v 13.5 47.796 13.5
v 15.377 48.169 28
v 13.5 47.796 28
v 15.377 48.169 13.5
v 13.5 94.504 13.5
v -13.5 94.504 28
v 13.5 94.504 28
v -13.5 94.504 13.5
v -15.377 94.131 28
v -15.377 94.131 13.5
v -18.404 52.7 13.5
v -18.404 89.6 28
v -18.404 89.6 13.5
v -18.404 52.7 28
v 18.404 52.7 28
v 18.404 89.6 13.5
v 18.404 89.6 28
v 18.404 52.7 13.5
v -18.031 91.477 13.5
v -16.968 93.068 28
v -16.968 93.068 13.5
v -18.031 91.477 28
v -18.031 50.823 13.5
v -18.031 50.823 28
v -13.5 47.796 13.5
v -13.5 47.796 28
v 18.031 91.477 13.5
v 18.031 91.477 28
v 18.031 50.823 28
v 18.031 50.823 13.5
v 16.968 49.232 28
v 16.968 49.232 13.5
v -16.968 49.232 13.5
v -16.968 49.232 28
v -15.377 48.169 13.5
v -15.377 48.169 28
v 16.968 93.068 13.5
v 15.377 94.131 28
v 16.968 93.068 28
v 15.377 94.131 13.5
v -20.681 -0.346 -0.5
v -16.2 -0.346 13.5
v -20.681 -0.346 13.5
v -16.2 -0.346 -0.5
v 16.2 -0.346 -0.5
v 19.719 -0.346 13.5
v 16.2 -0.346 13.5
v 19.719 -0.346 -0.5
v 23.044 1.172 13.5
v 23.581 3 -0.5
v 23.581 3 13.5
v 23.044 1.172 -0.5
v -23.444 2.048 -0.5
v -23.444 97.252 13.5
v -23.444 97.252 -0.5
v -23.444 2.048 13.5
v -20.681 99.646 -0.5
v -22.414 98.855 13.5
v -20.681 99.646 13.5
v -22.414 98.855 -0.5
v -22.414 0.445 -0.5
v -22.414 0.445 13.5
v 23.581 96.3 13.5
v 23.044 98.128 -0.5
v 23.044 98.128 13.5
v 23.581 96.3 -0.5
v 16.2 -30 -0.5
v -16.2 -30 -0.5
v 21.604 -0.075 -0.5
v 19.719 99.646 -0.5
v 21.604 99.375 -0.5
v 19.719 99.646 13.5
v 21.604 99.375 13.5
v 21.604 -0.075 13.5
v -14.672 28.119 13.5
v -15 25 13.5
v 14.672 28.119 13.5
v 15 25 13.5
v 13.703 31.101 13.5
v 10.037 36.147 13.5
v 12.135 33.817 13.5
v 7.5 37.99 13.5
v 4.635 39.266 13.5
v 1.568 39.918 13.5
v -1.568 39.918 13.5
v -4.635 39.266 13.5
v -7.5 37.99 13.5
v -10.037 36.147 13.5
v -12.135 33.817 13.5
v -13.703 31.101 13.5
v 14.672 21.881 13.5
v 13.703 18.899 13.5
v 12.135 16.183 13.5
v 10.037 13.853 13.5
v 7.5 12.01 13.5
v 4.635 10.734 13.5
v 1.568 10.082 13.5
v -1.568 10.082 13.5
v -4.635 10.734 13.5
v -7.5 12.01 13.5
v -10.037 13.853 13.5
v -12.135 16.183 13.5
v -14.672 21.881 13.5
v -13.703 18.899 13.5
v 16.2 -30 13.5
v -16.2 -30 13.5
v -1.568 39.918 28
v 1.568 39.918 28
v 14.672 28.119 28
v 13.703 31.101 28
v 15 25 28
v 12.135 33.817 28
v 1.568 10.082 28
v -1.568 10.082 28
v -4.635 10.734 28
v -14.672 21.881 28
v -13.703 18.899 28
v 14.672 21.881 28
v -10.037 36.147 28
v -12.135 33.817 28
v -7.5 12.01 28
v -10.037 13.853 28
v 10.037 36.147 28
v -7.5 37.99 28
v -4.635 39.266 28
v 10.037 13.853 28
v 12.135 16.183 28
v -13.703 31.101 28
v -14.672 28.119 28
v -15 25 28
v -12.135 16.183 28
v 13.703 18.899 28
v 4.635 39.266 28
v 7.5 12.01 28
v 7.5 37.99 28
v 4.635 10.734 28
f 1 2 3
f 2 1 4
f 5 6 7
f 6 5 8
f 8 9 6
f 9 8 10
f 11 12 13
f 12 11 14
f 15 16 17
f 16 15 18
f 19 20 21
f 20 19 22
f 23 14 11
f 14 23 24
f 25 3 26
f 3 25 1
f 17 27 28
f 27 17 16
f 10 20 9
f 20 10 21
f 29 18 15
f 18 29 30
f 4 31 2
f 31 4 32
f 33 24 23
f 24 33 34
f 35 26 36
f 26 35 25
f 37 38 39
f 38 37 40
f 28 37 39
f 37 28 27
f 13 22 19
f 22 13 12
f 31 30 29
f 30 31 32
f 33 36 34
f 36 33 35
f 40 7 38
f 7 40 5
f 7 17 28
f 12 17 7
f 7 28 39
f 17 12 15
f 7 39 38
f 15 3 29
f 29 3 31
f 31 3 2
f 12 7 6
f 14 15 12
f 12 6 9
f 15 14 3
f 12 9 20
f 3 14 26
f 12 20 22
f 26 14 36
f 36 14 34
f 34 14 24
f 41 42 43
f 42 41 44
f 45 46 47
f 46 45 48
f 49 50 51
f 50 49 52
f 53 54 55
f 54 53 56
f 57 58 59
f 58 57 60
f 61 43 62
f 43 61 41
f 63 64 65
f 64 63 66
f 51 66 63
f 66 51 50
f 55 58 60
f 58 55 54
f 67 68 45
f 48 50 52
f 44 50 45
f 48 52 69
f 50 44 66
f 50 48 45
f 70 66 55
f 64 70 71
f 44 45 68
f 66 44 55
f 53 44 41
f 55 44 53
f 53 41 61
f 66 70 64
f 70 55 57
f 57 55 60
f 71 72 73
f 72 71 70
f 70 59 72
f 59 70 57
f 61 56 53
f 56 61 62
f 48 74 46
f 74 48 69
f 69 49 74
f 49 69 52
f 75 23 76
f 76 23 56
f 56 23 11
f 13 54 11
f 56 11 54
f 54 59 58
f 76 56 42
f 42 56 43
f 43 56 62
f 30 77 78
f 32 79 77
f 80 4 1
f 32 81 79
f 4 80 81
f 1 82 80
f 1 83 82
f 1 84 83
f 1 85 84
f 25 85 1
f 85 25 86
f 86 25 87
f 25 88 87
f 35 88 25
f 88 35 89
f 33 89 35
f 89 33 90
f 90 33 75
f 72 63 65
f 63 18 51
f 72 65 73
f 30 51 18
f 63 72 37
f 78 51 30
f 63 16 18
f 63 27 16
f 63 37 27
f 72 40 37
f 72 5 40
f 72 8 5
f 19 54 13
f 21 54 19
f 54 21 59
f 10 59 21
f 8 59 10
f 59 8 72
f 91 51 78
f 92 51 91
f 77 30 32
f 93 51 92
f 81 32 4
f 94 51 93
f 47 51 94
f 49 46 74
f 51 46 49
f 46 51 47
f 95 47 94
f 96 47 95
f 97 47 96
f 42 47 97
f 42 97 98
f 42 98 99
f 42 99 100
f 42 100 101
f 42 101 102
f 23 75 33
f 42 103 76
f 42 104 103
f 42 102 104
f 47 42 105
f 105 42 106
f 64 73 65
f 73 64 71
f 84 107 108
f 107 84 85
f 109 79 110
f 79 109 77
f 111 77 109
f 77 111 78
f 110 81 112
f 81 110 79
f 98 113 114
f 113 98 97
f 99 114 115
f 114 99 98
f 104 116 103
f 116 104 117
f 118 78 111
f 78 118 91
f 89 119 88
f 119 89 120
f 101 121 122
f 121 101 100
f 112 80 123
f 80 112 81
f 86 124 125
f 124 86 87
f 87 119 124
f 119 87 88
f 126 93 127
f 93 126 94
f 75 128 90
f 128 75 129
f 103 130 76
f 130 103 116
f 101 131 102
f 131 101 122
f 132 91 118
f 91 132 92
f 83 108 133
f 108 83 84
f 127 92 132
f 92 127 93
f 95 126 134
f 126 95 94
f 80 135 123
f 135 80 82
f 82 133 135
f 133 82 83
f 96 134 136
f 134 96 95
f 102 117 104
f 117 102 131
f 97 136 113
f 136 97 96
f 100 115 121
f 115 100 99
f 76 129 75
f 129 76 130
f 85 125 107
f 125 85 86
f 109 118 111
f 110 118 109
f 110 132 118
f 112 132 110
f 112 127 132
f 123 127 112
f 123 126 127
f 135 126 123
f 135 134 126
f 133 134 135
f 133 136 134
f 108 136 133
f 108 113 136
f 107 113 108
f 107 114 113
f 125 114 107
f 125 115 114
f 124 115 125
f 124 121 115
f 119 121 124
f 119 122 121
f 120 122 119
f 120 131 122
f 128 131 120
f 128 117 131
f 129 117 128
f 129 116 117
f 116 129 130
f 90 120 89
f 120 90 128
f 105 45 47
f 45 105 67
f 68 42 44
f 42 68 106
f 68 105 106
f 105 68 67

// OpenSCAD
// file: roundedCube.scad
// Example:
roundedCube(
  x = 30,
  y = 20,
  z = 10,
  r = 3,
  flatBottom = true
);

module roundedCube(
  x,
  y,
  z,
  r = 0,
  flatTop = false,
  flatBottom = false,
  flatLeft = false,
  flatRight = false,
  flatFront = false,
  flatBack = false
) {

  // Calculate [ x, y, z ] compensations based on requested roundings:
  rX = r * (flatLeft && flatRight ? 0 : (flatLeft || flatRight ? 1 : 2));
  rY = r * (flatFront && flatBack ? 0 : (flatFront || flatBack ? 1 : 2));
  rZ = r * (flatTop && flatBottom ? 0 : (flatTop || flatBottom ? 1 : 2));

  // Do some sanity checks:
  if (x - rX <= 0) {
    echo("<b style='color: red'>WARNING</b>: roundedCube() is too small along its x-axis");
  }
  if (y - rY <= 0) {
    echo("<b style='color: red'>WARNING</b>: roundedCube() is too small along its y-axis");
  }
  if (z - rZ <= 0) {
    echo("<b style='color: red'>WARNING</b>: roundedCube() is too small along its z-axis");
  }

  difference() {

    // Main rounded cube:
    translate([
      flatLeft ? 0 : r,
      flatFront ? 0 : r,
      flatBottom ? 0 : r
    ]) {
      minkowski() {
        cube([
          x - rX,
          y - rY,
          z - rZ
        ]);
        sphere(r = r);
      }
    }

    // Optional cutouts:
    // (let's not generate unnecessary geometry)
    if (flatTop) {
      translate([ x / -2, y / -2, z ])
      cube([ x * 2, y * 2, z ]);
    }
    if (flatBottom) {
      translate([ x / -2, y / -2, -z ])
      cube([ x * 2, y * 2, z ]);
    }
    if (flatLeft) {
      translate([ -x, y / -2, z / -2 ])
      cube([ x, y * 2, z * 2 ]);
    }
    if (flatRight) {
      translate([ x, y / -2, z / -2 ])
      cube([ x, y * 2, z * 2 ]);
    }
    if (flatFront) {
      translate([ x / -2, -y, z / -2 ])
      cube([ x * 2, y, z * 2 ]);
    }
    if (flatBack) {
      translate([ x / -2, y, z / -2 ])
      cube([ x * 2, y, z * 2 ]);
    }

  }

}
// file: config.scad
GLOBAL_ROUNDING = 5;

DEXCOM_WIDTH = 46.4;
DEXCOM_HEIGHT = 99.3;
DEXCOM_DEPTH = 13.0;
DEXCOM_ROUNDING = 3.5;

SAMSUNG_WIDTH = 69.8;
SAMSUNG_HEIGHT = 136.5;
SAMSUNG_DEPTH = 8.3;
SAMSUNG_CAM_BUMP_HEIGHT = 3; // actually measured: 0.7
SAMSUNG_BUTTONS_HEIGHT = 2; // actually measured: 0.5
SAMSUNG_ROUNDING = 7; // approximation

MOPHIE_WIDTH = 69.3;
MOPHIE_HEIGHT = 119.3;
MOPHIE_DEPTH = 12.8;
MOPHIE_ROUNDING = 4.5; // approximation

RIG_WIDTH = 75;
RIG_HEIGHT = 150;
RIG_WALL_THICKNESS = 3.5;
// main file
include <config.scad>;

use <roundedCube.scad>;

// Example:
dexcom(0.5);

module dexcom(
  withTolerance = 0
) {

  // Main body:
  minkowski() {
    translate([ DEXCOM_WIDTH / -2, 0, 0 ])
    roundedCube(
      DEXCOM_WIDTH,
      DEXCOM_HEIGHT,
      DEXCOM_DEPTH,
      r = DEXCOM_ROUNDING,
      flatTop = true,
      flatBottom = true
    );
    translate([ -withTolerance, -withTolerance, -withTolerance ])
    cube([ withTolerance * 2, withTolerance * 2, withTolerance * 2 ]);
  }

  // Screen access:
  screenMargin = 4.7;
  screenHeight = 46.9;
  screenSpace = 15;
  translate([ DEXCOM_WIDTH / -2 + screenMargin, DEXCOM_HEIGHT - screenHeight - screenMargin, DEXCOM_DEPTH ])
  #roundedCube(
    DEXCOM_WIDTH - screenMargin * 2,
    screenHeight,
    screenSpace,
    r = GLOBAL_ROUNDING,
    flatTop = true,
    flatBottom = true
  );

  // Keypad access:
  keypadDiameter = 30;
  keypadDistance = 25; // from the bottom edge
  translate([ 0, keypadDistance, DEXCOM_DEPTH ])
  #cylinder(r = keypadDiameter / 2, h = screenSpace);

  // Bottom access:
  bottomMargin = 7;
  bottomSpace = 30;
  translate([ DEXCOM_WIDTH / -2 + bottomMargin, -bottomSpace, -withTolerance ])
  #cube([
    DEXCOM_WIDTH - bottomMargin * 2,
    bottomSpace,
    DEXCOM_DEPTH + withTolerance * 2
  ]);

}
